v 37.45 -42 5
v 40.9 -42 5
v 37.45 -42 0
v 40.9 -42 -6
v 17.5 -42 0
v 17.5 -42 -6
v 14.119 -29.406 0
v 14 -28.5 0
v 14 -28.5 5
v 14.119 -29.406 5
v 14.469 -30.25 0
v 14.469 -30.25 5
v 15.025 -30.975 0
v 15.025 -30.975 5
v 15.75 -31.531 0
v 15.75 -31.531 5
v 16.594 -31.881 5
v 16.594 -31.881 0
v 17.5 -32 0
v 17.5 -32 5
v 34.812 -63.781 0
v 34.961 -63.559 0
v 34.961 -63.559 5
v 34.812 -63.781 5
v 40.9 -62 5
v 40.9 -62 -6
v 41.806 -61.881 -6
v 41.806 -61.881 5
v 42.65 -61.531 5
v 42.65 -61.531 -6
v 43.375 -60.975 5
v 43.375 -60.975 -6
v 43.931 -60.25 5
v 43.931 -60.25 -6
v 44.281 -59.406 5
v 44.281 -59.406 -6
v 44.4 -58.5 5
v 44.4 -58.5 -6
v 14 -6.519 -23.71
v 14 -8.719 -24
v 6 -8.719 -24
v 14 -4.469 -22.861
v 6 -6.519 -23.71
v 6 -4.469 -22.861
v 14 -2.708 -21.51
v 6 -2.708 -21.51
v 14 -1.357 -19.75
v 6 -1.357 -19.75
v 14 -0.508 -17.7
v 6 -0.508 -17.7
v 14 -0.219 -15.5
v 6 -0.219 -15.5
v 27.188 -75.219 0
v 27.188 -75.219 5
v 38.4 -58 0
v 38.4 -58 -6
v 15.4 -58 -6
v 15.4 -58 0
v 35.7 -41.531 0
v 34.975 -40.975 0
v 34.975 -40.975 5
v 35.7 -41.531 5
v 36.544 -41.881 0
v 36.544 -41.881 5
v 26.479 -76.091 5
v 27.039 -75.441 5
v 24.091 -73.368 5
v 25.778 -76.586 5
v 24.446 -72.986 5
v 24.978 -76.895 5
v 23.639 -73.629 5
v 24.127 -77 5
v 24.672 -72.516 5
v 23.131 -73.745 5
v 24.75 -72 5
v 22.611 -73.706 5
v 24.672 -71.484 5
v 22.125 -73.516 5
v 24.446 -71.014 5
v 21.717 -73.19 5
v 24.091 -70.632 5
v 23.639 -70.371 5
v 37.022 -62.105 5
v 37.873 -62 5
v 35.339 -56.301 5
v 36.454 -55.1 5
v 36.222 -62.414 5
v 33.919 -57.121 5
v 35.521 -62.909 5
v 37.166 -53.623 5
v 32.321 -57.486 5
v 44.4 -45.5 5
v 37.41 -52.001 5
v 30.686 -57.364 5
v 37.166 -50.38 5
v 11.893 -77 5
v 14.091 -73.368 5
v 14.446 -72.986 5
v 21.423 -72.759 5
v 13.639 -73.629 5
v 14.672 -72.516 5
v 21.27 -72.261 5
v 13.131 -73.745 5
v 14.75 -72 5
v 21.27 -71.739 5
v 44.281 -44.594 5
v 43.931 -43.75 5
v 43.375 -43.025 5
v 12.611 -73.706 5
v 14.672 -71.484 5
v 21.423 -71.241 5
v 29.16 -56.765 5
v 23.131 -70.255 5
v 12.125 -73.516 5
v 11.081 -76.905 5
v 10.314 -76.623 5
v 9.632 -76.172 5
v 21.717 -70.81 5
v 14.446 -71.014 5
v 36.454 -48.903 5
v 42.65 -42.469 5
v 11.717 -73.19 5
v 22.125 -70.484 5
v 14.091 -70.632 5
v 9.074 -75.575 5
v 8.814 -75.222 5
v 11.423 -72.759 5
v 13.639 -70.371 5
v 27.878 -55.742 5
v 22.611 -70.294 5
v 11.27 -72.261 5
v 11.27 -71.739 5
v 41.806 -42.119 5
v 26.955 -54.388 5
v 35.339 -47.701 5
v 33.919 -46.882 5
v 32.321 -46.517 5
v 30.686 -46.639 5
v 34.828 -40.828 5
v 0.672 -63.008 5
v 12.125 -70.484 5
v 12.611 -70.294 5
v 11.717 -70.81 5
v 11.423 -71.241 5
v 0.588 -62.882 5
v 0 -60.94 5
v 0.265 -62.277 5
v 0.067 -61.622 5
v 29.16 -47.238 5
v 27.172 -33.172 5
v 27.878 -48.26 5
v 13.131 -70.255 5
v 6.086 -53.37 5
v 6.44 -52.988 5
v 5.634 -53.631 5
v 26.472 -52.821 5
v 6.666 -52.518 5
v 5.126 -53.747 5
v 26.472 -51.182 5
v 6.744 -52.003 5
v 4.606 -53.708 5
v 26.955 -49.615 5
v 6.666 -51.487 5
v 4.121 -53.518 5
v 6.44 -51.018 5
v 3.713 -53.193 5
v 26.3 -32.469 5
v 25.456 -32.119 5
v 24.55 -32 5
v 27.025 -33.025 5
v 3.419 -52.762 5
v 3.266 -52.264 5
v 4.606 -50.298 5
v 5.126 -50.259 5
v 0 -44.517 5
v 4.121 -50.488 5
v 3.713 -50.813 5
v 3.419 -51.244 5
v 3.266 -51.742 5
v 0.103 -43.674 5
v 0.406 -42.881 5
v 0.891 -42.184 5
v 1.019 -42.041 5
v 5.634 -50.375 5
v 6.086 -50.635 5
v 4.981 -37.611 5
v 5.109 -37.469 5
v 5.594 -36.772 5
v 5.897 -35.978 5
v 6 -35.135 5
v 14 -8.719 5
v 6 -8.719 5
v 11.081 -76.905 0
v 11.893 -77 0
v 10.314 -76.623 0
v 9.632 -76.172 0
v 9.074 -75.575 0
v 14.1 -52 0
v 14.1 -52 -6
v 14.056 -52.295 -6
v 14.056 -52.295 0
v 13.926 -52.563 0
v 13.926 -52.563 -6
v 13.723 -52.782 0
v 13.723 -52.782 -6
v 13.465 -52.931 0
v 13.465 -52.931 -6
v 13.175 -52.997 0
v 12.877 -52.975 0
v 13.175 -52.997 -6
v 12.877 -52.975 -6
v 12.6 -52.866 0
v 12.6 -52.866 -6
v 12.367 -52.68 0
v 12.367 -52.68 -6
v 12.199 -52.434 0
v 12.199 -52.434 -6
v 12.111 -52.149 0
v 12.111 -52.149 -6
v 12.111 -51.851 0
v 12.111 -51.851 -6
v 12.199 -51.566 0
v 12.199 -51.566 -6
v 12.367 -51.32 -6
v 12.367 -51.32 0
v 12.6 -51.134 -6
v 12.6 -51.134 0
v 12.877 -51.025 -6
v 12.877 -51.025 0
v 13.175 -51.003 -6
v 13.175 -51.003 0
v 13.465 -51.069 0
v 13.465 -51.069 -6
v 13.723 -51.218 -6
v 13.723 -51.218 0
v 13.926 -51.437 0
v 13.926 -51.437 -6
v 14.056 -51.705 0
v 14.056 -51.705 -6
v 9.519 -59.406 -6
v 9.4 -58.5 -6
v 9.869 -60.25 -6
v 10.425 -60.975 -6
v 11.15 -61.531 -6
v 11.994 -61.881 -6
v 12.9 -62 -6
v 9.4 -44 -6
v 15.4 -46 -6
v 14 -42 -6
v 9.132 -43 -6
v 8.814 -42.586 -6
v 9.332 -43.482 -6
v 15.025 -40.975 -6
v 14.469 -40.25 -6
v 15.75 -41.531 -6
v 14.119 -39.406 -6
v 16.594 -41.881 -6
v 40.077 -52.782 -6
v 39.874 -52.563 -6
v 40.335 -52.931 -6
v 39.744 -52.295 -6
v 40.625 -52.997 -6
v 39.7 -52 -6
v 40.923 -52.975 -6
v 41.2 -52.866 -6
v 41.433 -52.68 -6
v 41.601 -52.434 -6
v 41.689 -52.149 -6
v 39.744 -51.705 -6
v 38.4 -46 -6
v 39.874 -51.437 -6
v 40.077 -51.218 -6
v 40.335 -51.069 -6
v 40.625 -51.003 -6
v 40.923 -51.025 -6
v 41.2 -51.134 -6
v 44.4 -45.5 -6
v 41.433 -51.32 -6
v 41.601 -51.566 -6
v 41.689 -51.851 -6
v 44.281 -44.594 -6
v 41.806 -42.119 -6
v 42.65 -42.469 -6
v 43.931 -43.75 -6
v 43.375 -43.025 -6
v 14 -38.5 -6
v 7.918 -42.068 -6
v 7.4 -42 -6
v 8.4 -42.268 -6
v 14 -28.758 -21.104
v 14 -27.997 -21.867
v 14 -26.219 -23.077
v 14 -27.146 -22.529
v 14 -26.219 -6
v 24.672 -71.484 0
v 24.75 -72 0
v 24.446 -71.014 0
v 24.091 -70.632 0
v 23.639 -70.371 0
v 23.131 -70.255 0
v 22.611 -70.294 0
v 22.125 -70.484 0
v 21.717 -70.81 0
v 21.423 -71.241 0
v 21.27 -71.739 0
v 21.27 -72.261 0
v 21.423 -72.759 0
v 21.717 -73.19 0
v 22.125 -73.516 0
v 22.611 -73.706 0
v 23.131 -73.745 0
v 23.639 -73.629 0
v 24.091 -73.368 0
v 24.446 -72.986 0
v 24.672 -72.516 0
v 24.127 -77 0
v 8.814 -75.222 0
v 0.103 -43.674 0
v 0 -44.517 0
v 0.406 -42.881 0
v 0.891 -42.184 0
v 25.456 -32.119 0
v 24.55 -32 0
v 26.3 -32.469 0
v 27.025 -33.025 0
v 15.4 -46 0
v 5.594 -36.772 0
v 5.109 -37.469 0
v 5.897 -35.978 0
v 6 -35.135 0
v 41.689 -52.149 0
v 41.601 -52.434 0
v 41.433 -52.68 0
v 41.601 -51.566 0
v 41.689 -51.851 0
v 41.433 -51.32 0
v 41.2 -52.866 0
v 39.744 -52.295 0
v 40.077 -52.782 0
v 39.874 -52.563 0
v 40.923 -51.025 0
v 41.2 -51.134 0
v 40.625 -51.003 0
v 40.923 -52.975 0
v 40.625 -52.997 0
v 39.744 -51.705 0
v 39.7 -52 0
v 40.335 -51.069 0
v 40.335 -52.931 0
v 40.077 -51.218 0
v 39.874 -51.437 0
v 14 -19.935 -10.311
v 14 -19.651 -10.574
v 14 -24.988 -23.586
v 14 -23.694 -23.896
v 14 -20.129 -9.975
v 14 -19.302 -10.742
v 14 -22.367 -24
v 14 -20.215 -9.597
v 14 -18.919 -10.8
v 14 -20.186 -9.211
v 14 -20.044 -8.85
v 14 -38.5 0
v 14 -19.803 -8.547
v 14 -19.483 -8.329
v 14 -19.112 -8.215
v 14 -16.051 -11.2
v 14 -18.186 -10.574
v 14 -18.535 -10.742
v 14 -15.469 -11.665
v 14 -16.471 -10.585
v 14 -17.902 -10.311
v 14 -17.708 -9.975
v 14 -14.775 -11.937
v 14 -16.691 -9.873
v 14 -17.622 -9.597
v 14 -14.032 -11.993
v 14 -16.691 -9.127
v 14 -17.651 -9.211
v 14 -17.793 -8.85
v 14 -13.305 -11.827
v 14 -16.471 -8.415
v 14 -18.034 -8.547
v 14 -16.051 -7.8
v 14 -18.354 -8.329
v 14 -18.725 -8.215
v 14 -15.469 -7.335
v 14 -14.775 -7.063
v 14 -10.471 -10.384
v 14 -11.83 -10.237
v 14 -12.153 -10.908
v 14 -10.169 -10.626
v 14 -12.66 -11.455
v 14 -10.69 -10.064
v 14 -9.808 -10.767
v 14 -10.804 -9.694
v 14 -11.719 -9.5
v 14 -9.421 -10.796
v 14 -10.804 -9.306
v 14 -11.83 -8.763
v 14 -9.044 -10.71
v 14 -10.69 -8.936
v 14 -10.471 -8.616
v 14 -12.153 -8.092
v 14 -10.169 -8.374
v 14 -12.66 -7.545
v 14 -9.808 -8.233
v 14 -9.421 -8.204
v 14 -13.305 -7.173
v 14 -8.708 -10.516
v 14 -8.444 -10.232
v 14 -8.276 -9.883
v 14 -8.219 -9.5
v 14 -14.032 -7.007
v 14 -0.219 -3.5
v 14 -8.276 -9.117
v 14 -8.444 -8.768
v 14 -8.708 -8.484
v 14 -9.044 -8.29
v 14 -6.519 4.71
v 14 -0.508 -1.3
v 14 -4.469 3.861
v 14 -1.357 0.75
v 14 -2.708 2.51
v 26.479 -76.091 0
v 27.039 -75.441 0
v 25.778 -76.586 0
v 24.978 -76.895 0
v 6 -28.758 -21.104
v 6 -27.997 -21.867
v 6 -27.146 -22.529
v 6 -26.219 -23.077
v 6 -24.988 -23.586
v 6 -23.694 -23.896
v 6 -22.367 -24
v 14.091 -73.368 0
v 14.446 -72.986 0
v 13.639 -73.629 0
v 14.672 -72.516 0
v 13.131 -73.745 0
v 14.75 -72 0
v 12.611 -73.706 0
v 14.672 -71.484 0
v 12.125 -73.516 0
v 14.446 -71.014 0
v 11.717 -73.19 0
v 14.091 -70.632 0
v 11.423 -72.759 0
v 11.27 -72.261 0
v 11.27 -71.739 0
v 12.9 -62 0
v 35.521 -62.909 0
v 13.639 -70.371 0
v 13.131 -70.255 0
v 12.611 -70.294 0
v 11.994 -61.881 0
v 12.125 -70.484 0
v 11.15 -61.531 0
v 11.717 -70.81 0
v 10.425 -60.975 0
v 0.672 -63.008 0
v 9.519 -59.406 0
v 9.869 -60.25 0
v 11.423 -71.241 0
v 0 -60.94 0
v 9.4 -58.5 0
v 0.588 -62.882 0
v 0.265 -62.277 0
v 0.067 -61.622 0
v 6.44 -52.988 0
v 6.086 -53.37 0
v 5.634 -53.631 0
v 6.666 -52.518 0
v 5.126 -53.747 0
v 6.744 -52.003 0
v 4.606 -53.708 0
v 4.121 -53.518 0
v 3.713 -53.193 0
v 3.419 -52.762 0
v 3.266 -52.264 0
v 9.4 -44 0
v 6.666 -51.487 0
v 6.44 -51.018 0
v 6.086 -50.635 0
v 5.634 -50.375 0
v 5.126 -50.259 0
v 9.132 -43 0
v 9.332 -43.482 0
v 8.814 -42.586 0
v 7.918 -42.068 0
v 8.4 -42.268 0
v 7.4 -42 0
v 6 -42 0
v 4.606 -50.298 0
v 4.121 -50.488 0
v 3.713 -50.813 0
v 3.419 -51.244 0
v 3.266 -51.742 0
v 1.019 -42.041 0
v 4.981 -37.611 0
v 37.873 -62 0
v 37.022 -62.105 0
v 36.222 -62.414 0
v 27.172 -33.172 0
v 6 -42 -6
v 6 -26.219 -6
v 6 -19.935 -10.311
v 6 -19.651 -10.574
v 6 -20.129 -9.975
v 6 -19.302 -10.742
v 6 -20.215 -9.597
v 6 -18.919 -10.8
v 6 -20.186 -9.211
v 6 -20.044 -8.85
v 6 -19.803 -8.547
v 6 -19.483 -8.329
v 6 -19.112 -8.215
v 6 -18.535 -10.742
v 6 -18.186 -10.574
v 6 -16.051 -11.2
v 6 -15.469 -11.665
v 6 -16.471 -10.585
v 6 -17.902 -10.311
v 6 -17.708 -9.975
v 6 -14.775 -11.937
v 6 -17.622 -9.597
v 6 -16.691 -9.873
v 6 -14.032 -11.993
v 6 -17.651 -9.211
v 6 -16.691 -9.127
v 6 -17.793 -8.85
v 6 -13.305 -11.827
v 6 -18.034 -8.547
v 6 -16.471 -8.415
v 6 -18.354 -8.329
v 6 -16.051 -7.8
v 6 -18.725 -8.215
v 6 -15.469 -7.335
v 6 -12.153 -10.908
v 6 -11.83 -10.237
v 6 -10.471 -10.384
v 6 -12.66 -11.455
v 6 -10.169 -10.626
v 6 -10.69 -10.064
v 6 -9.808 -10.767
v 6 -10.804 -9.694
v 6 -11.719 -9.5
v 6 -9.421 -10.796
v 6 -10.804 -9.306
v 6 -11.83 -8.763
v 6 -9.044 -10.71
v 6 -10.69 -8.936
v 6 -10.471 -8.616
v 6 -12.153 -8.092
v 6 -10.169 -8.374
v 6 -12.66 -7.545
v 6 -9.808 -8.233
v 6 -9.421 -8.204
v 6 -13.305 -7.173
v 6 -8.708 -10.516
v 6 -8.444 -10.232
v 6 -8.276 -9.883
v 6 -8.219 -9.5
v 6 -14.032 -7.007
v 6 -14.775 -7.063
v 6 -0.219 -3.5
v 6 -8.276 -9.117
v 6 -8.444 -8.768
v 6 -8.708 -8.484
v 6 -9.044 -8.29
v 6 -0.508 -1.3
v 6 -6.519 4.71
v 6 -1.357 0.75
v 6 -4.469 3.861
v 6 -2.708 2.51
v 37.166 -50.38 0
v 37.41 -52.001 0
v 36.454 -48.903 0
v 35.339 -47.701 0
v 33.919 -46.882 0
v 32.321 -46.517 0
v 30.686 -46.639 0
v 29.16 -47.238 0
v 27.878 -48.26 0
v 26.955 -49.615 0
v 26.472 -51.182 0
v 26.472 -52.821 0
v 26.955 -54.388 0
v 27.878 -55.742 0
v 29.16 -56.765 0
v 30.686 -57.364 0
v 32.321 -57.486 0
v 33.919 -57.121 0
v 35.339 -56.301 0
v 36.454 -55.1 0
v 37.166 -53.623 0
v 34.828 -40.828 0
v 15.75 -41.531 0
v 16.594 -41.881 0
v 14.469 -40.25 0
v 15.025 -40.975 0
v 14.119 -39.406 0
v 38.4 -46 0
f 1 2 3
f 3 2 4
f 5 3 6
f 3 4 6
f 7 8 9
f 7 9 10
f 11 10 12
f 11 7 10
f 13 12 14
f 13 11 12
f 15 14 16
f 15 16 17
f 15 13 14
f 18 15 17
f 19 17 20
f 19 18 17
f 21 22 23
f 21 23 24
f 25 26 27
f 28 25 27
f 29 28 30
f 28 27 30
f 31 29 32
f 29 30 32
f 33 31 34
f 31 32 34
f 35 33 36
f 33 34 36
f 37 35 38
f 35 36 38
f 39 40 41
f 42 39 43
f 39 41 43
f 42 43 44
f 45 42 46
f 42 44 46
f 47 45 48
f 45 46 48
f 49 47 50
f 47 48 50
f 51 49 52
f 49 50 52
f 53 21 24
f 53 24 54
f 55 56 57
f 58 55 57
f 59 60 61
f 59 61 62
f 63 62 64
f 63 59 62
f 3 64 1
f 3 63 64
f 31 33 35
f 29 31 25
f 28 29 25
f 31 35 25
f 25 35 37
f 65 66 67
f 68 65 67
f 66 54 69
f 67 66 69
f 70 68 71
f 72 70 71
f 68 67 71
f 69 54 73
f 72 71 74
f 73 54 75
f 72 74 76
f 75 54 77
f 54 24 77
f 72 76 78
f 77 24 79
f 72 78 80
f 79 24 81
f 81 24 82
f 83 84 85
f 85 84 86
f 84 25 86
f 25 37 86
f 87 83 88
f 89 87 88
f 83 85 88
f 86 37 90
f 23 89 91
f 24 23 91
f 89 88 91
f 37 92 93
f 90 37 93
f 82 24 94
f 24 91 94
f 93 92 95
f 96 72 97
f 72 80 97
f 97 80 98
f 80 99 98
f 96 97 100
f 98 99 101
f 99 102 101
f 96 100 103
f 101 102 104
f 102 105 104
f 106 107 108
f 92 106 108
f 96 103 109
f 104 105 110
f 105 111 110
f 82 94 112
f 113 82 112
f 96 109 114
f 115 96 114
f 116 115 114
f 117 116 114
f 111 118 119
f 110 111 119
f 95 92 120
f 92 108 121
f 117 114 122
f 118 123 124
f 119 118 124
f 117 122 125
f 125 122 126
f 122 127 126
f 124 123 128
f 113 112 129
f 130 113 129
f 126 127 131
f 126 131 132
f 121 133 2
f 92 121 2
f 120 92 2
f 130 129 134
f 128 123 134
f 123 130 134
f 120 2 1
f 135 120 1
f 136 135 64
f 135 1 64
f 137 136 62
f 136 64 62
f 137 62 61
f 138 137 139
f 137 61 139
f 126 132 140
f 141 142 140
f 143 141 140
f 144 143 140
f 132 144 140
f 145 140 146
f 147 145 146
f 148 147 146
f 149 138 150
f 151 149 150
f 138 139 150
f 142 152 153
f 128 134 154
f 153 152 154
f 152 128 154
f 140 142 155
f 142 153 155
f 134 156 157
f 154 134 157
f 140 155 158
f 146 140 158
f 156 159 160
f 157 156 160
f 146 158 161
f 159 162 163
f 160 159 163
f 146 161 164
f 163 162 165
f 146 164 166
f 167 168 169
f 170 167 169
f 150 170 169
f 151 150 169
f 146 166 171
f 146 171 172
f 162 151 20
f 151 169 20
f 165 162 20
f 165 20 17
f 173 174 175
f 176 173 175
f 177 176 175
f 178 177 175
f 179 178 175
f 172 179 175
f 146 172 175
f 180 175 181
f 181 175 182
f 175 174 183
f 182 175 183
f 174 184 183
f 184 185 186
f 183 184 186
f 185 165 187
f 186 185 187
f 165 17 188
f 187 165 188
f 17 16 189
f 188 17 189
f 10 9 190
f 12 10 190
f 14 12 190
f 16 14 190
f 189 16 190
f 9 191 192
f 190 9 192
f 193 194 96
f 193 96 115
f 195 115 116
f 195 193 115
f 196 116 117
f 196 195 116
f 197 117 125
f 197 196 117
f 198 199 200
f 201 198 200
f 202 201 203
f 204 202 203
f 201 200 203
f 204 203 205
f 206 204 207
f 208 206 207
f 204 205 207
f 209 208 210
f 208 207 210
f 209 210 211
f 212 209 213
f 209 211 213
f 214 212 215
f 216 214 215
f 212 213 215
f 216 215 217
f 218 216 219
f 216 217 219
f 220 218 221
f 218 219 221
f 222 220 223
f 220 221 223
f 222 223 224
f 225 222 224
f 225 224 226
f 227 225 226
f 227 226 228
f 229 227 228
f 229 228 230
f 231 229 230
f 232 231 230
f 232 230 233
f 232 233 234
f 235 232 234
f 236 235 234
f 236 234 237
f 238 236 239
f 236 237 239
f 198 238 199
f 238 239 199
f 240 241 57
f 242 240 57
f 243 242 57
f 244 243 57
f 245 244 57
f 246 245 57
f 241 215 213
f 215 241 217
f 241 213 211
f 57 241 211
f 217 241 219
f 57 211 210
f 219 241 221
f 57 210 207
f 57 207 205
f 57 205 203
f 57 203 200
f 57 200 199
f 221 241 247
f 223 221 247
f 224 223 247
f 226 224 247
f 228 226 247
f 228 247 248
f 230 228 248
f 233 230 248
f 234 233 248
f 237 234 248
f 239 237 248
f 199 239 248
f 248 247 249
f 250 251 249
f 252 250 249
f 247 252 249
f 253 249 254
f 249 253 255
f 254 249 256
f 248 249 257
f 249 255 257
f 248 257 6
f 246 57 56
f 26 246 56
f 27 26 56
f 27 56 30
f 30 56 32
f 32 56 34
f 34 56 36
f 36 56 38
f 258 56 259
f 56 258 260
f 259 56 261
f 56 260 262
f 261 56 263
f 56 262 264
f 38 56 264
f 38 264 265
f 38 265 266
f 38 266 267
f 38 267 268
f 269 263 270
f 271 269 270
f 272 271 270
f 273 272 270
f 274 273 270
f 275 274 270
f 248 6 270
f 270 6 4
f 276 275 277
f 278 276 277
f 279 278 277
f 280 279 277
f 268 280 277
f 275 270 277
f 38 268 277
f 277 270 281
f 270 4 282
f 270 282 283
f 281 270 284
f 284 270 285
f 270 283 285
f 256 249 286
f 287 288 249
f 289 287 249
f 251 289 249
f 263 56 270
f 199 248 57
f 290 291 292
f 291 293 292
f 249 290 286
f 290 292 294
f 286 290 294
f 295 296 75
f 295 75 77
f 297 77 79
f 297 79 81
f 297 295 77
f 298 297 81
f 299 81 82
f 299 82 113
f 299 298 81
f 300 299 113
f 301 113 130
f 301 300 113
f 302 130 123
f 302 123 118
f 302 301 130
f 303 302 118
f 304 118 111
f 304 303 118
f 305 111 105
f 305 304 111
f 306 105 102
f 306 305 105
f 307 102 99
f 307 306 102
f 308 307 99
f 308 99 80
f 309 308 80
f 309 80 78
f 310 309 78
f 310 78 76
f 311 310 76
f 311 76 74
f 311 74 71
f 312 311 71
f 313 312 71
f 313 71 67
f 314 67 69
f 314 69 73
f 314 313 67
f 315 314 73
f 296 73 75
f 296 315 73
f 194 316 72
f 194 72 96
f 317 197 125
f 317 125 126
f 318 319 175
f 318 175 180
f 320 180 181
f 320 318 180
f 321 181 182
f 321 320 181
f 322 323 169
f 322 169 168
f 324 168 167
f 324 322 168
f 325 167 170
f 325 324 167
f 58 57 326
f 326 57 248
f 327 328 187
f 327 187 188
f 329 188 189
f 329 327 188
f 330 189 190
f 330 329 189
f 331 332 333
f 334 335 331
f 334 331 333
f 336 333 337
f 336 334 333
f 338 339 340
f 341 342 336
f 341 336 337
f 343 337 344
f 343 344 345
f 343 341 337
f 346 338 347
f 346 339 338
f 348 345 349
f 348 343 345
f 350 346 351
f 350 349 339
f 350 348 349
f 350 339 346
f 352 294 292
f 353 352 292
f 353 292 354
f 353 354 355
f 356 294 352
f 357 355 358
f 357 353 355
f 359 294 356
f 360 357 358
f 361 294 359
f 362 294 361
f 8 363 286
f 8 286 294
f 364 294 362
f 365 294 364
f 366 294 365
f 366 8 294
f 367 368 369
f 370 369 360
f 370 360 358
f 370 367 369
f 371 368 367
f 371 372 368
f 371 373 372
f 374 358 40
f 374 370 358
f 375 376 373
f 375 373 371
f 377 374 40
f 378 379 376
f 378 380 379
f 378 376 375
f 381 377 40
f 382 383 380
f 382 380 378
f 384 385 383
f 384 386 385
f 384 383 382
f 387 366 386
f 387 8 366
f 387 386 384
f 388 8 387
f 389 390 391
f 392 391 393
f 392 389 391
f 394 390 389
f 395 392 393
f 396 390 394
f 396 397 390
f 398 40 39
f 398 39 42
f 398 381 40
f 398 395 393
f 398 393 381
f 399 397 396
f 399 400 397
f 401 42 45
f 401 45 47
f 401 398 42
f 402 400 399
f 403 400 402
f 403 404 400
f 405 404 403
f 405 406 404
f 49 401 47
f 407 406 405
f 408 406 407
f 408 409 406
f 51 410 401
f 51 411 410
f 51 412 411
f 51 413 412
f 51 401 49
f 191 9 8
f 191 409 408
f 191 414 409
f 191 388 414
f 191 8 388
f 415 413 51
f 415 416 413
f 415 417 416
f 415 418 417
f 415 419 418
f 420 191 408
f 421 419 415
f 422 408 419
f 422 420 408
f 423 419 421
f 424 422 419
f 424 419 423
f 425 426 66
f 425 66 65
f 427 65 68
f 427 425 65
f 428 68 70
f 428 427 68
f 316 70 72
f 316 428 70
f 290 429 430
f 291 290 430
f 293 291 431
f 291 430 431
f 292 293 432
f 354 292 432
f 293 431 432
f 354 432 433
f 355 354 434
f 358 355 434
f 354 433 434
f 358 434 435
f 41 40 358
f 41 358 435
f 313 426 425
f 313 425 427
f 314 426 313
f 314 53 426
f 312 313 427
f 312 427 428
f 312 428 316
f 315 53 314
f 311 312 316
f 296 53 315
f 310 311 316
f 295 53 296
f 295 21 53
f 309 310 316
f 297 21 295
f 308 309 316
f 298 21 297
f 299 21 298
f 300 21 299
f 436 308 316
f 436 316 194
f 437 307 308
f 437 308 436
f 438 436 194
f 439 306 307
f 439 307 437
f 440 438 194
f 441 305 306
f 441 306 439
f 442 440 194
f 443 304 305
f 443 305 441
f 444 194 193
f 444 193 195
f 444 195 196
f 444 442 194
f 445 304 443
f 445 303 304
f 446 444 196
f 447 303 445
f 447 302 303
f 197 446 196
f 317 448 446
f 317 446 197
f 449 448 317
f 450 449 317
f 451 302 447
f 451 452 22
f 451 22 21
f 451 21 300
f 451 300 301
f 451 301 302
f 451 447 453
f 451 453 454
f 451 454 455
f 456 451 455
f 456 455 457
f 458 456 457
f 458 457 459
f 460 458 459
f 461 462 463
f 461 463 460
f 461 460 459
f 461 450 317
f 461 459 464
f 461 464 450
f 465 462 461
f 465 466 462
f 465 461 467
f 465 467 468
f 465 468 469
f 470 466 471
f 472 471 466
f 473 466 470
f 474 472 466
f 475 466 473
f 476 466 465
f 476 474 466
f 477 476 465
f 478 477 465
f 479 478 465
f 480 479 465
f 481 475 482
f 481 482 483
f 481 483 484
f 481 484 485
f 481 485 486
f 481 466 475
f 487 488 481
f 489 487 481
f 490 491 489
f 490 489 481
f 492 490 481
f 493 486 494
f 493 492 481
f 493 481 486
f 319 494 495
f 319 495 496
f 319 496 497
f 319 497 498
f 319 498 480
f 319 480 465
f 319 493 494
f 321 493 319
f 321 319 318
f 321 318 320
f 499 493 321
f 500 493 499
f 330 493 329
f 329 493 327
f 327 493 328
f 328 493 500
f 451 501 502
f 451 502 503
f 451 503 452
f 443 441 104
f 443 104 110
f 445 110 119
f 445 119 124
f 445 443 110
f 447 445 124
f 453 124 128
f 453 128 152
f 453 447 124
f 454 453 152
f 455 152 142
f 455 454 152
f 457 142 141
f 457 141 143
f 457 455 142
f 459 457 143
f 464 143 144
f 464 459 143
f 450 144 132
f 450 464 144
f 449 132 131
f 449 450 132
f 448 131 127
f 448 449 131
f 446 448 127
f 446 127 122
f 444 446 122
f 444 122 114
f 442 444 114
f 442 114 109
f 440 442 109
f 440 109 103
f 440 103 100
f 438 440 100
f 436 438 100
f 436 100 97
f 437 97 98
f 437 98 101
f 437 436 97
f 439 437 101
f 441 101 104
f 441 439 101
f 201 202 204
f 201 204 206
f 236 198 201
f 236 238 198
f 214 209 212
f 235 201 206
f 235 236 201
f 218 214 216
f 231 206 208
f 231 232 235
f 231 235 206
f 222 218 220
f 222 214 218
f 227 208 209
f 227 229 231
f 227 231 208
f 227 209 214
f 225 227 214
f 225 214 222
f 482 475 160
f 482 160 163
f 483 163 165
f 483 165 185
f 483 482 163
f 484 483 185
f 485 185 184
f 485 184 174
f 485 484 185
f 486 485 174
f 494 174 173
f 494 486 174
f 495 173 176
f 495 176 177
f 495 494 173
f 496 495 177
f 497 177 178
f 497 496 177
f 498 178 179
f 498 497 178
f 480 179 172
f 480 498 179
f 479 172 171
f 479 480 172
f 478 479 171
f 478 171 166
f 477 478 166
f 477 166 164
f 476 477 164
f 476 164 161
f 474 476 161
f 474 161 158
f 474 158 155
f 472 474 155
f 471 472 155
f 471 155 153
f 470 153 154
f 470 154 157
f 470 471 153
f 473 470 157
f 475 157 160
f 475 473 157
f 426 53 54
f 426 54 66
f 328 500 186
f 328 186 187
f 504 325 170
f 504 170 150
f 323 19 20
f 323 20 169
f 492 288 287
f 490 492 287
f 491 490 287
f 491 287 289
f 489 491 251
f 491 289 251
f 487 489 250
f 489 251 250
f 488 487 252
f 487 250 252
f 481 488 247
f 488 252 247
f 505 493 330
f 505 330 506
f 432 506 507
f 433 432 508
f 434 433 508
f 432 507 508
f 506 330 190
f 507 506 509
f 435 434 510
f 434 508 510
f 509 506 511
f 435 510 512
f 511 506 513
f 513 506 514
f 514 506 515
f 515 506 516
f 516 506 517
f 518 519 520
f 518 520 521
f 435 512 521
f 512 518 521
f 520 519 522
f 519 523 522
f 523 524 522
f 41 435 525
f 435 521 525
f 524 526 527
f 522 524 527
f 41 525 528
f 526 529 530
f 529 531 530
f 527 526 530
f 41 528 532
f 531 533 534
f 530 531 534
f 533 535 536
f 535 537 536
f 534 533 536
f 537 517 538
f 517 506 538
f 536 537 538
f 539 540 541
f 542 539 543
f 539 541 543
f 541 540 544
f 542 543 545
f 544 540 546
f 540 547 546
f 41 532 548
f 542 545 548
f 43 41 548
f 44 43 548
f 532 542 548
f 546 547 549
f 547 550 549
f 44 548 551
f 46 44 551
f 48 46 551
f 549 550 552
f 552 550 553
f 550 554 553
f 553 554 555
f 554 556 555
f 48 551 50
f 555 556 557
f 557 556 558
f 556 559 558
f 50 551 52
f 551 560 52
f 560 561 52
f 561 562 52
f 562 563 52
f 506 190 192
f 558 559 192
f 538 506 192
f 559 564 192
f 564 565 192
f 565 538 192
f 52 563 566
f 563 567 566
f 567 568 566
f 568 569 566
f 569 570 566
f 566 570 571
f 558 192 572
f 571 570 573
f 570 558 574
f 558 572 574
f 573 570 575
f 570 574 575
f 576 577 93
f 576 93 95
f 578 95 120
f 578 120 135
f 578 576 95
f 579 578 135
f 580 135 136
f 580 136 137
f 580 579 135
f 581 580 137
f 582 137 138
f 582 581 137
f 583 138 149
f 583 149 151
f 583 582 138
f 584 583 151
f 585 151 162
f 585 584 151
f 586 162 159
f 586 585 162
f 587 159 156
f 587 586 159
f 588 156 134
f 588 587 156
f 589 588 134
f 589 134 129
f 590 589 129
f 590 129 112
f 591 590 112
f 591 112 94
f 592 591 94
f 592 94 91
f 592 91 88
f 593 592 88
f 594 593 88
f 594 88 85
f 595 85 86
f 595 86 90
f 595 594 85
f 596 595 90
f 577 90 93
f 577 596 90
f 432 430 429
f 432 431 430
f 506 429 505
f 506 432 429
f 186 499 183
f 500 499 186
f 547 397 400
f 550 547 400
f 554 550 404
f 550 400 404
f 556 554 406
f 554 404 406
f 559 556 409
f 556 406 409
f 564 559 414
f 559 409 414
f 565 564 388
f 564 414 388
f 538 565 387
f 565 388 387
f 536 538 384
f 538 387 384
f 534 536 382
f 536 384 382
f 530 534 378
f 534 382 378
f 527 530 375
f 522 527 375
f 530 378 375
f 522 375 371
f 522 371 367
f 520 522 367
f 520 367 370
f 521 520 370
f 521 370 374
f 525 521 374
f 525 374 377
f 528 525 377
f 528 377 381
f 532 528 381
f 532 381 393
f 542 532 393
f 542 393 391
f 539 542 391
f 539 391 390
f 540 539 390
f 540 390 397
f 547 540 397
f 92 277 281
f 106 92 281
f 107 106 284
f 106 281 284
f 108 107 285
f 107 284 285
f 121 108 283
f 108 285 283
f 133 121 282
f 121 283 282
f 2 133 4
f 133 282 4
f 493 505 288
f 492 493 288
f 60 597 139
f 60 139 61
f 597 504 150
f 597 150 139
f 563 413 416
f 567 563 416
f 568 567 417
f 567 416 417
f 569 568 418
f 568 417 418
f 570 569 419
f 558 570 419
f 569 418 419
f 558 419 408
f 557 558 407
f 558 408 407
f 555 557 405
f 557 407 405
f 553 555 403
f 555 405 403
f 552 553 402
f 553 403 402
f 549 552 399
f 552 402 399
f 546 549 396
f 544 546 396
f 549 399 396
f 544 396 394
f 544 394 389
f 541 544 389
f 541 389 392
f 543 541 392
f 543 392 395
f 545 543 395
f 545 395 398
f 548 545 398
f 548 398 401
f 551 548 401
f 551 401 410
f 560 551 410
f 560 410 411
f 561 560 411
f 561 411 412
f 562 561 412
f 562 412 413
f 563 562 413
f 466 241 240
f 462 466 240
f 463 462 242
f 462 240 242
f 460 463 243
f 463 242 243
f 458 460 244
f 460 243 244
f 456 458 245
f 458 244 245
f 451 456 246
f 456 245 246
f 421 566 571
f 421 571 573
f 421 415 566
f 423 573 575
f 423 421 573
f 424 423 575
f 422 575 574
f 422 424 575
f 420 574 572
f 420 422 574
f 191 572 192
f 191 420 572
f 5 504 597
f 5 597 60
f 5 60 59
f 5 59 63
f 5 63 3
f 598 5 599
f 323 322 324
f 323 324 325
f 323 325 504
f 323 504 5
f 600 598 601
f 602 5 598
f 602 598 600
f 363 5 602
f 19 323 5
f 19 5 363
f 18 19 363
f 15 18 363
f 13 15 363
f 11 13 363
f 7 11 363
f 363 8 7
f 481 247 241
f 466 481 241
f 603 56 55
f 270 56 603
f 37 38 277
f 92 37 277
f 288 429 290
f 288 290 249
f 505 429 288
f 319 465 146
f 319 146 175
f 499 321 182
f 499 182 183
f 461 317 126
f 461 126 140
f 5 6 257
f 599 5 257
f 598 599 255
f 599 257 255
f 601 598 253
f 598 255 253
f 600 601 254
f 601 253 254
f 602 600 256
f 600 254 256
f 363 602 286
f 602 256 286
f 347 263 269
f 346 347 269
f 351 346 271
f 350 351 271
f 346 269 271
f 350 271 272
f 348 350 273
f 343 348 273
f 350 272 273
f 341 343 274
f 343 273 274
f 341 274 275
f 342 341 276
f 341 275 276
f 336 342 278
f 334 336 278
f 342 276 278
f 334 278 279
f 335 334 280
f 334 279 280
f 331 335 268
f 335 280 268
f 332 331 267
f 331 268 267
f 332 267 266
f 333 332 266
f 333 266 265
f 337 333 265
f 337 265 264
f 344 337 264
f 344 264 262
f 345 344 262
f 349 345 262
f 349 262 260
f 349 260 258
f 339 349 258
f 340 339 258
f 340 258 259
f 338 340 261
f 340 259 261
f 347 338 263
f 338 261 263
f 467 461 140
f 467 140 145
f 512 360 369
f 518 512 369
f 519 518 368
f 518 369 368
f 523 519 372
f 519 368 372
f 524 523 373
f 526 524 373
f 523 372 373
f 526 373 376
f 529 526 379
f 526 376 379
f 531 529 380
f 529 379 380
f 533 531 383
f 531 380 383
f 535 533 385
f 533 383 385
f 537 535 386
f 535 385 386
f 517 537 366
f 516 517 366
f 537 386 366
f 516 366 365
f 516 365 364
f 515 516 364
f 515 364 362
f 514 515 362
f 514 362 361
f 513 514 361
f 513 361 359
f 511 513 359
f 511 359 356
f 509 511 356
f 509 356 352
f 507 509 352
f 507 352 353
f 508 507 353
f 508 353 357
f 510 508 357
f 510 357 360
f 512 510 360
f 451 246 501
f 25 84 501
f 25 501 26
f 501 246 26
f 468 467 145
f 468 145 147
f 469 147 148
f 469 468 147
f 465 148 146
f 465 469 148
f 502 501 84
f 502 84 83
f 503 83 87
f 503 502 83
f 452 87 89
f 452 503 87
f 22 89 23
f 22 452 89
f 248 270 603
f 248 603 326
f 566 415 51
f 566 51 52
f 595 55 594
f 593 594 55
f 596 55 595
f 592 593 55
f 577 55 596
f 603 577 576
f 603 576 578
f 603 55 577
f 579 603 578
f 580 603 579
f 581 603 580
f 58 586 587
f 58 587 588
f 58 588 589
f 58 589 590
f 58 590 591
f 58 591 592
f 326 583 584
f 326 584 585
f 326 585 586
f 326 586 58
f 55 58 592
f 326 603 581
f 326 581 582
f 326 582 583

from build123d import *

# Parameters (mm, degrees)
SKETCH2_R           = 5.5
SKETCH2_R_2         = 1.750005389
SKETCH2_R_3         = 1.749978063
SKETCH2_R_4         = 1.749044057
BOSS_EXTRUDE1_DEPTH = 5
BOSS_EXTRUDE2_START = 6
SKETCH3_R           = 1
SKETCH3_W           = 23
SKETCH3_H           = 11.999999553
BOSS_EXTRUDE2_DEPTH = 6
SKETCH4_W           = 8.00000038
SKETCH4_H           = 26
BOSS_EXTRUDE3_DEPTH = 18
BOSS_EXTRUDE4_DEPTH = 4
FILLET1_R           = 8.5
SKETCH6_R           = 2.5
SKETCH6_R_2         = 1.3
CUT_EXTRUDE1_DEPTH  = 87.192574237


with BuildPart() as part:
    # Sketch2 → Boss-Extrude1 (new body)
    with BuildSketch(Plane.XY):
        with BuildLine():
            Line((6.000000052, -0.218525005), (14.000000432, -0.218525005))
            Line((14.000000432, -0.218525005), (14.000000432, -28.000000864))
            Line((14.000000432, -28.000000864), (14.000000432, -28.50000152))
            ThreePointArc((14.000000432, -28.50000152), (15.025126698, -30.974875254), (17.500000432, -32.00000152))
            Line((17.500000432, -32.00000152), (17.999999225, -32.00000152))
            Line((17.999999225, -32.00000152), (24.343099445, -32.00000152))
            Line((24.343099445, -32.00000152), (24.550253068, -32.00000152))
            ThreePointArc((24.550253068, -32.00000152), (25.889645081, -32.266423156), (27.025126802, -33.025127786))
            Line((27.025126802, -33.025127786), (27.17160061, -33.171601593))
            Line((27.17160061, -33.171601593), (34.828398377, -40.82839936))
            Line((34.828398377, -40.82839936), (34.974872184, -40.974873168))
            ThreePointArc((34.974872184, -40.974873168), (36.110353905, -41.733577798), (37.449745919, -41.999999434))
            Line((37.449745919, -41.999999434), (37.656899542, -41.999999434))
            Line((37.656899542, -41.999999434), (40.399998426, -41.999999434))
            Line((40.399998426, -41.999999434), (40.899999082, -41.999999434))
            ThreePointArc((40.899999082, -41.999999434), (43.374872816, -43.0251257), (44.399999082, -45.499999434))
            Line((44.399999082, -45.499999434), (44.399999082, -46.000000089))
            Line((44.399999082, -46.000000089), (44.399999082, -57.999998331))
            Line((44.399999082, -57.999998331), (44.399999082, -58.499998987))
            ThreePointArc((44.399999082, -58.499998987), (43.374872816, -60.974872721), (40.899999082, -61.999998987))
            Line((40.899999082, -61.999998987), (40.399998426, -61.999998987))
            Line((40.399998426, -61.999998987), (38.140699267, -61.999998987))
            Line((38.140699267, -61.999998987), (37.873109304, -61.999998987))
            ThreePointArc((37.873109304, -61.999998987), (36.221600534, -62.414141118), (34.960925686, -63.558559682))
            Line((34.960925686, -63.558559682), (34.812498838, -63.781201839))
            Line((34.812498838, -63.781201839), (27.187500149, -75.21879673))
            Line((27.187500149, -75.21879673), (27.039073301, -75.441438887))
            ThreePointArc((27.039073301, -75.441438887), (25.778398453, -76.585857451), (24.126889683, -76.999999583))
            Line((24.126889683, -76.999999583), (23.859299719, -76.999999583))
            Line((23.859299719, -76.999999583), (12.140699662, -76.999999583))
            Line((12.140699662, -76.999999583), (11.893097313, -76.999999583))
            ThreePointArc((11.893097313, -76.999999583), (10.313829571, -76.62344534), (9.074378953, -75.574807238))
            Line((9.074378953, -75.574807238), (8.814488373, -75.22173434))
            Line((8.814488373, -75.22173434), (0.671799004, -63.007697463))
            Line((0.671799004, -63.007697463), (0.587823763, -62.881734572))
            ThreePointArc((0.587823763, -62.881734572), (0.150177853, -61.954528538), (0, -60.940284196))
            Line((0, -60.940284196), (0, -60.78889966))
            Line((0, -60.78889966), (0, -44.708199799))
            Line((0, -44.708199799), (0, -44.517187636))
            ThreePointArc((0, -44.517187636), (0.230396061, -43.268312109), (0.891251475, -42.183857155))
            Line((0.891251475, -42.183857155), (1.018580049, -42.041499168))
            Line((1.018580049, -42.041499168), (4.981420003, -37.610899657))
            Line((4.981420003, -37.610899657), (5.108748578, -37.46854167))
            ThreePointArc((5.108748578, -37.46854167), (5.769603991, -36.384086716), (6.000000052, -35.135211189))
            Line((6.000000052, -35.135211189), (6.000000052, -34.944299609))
            Line((6.000000052, -34.944299609), (6.000000052, -0.218525005))
        make_face()
        with Locations((31.910091824, -52.001420952)):
            Circle(SKETCH2_R, mode=Mode.SUBTRACT)
        with Locations((22.999980116, -71.999985367)):
            Circle(SKETCH2_R_2, mode=Mode.SUBTRACT)
        with Locations((13.000012747, -72.0000118)):
            Circle(SKETCH2_R_3, mode=Mode.SUBTRACT)
        with Locations((4.995051671, -52.002868251)):
            Circle(SKETCH2_R_4, mode=Mode.SUBTRACT)
    extrude(amount=BOSS_EXTRUDE1_DEPTH)

    # Sketch3 → Boss-Extrude2 (add)
    with BuildSketch(Plane(origin=(0, 0, 0), x_dir=(-1, 0, 0), z_dir=(0, 0, -1)).offset(BOSS_EXTRUDE2_START)):
        with BuildLine():
            Line((-37.873109304, -61.999998987), (-40.899999082, -61.999998987))
            ThreePointArc((-40.899999082, -61.999998987), (-43.374872816, -60.974872721), (-44.399999082, -58.499998987))
            Line((-44.399999082, -58.499998987), (-44.399999082, -45.499999434))
            ThreePointArc((-44.399999082, -45.499999434), (-43.374872816, -43.0251257), (-40.899999082, -41.999999434))
            Line((-40.899999082, -41.999999434), (-37.449745919, -41.999999434))
            Line((-37.449745919, -41.999999434), (-17.500000432, -41.999999434))
            ThreePointArc((-17.500000432, -41.999999434), (-15.025126698, -40.974873168), (-14.000000432, -38.499999434))
            Line((-14.000000432, -38.499999434), (-14.000000432, -0.218525005))
            Line((-14.000000432, -0.218525005), (-6.000000052, -0.218525005))
            Line((-6.000000052, -0.218525005), (-6.000000052, -41.999999434))
            Line((-6.000000052, -41.999999434), (-7.399999082, -41.999999434))
            ThreePointArc((-7.399999082, -41.999999434), (-8.814212644, -42.585785871), (-9.399999082, -43.999999434))
            Line((-9.399999082, -43.999999434), (-9.399999082, -58.499998987))
            ThreePointArc((-9.399999082, -58.499998987), (-10.425125348, -60.974872721), (-12.899999082, -61.999998987))
            Line((-12.899999082, -61.999998987), (-37.873109304, -61.999998987))
        make_face()
        with Locations((-40.699999082, -51.99999921)):
            Circle(SKETCH3_R, mode=Mode.SUBTRACT)
        with Locations(Location((-13.099999082, -51.99999921, 0), (0, 0, 180))):
            Circle(SKETCH3_R, mode=Mode.SUBTRACT)
        with Locations((-26.899999082, -51.999999211)):
            Rectangle(SKETCH3_W, SKETCH3_H, mode=Mode.SUBTRACT)
    extrude(amount=-BOSS_EXTRUDE2_DEPTH)

    # Sketch4 → Boss-Extrude3 (add)
    with BuildSketch(Plane(origin=(0, 0, -6), x_dir=(-1, 0, 0), z_dir=(0, 0, -1))):
        with Locations((-10.000000242, -13.218525005)):
            Rectangle(SKETCH4_W, SKETCH4_H)
    extrude(amount=BOSS_EXTRUDE3_DEPTH)

    # Sketch5 → Boss-Extrude4 (add, symmetric)
    with BuildSketch(Plane.ZY.offset(-10.000000242)):
        Polygon((-24, -26.218525005), (-6, -41.999999434), (-6, -26.218525005), align=None)
    extrude(amount=BOSS_EXTRUDE4_DEPTH, both=True)

    # Fillet1
    fillet1_edges = [part.edges().sort_by_distance(p)[0] for p in [
        (10.000000242, -0.218525005, 5),
        (10.000000242, -26.218525005, -24),
        (10.000000242, -0.218525005, -24),
    ]]
    fillet(fillet1_edges, radius=FILLET1_R)

    # Sketch6 → Cut-Extrude1 (cut, through all)
    with BuildSketch(Plane(origin=(14.000000432, 0, 0), x_dir=(0, 0, -1), z_dir=(1, 0, 0))):
        with Locations(Location((9.49999962, -14.218525005, 0), (0, 0, 90))):
            Circle(SKETCH6_R)
        with Locations(Location((9.5, -9.518525005, 0), (0, 0, 90))):
            Circle(SKETCH6_R_2)
        with Locations((9.5, -18.918525005)):
            Circle(SKETCH6_R_2)
    extrude(amount=-CUT_EXTRUDE1_DEPTH, mode=Mode.SUBTRACT)


solid = part.part
